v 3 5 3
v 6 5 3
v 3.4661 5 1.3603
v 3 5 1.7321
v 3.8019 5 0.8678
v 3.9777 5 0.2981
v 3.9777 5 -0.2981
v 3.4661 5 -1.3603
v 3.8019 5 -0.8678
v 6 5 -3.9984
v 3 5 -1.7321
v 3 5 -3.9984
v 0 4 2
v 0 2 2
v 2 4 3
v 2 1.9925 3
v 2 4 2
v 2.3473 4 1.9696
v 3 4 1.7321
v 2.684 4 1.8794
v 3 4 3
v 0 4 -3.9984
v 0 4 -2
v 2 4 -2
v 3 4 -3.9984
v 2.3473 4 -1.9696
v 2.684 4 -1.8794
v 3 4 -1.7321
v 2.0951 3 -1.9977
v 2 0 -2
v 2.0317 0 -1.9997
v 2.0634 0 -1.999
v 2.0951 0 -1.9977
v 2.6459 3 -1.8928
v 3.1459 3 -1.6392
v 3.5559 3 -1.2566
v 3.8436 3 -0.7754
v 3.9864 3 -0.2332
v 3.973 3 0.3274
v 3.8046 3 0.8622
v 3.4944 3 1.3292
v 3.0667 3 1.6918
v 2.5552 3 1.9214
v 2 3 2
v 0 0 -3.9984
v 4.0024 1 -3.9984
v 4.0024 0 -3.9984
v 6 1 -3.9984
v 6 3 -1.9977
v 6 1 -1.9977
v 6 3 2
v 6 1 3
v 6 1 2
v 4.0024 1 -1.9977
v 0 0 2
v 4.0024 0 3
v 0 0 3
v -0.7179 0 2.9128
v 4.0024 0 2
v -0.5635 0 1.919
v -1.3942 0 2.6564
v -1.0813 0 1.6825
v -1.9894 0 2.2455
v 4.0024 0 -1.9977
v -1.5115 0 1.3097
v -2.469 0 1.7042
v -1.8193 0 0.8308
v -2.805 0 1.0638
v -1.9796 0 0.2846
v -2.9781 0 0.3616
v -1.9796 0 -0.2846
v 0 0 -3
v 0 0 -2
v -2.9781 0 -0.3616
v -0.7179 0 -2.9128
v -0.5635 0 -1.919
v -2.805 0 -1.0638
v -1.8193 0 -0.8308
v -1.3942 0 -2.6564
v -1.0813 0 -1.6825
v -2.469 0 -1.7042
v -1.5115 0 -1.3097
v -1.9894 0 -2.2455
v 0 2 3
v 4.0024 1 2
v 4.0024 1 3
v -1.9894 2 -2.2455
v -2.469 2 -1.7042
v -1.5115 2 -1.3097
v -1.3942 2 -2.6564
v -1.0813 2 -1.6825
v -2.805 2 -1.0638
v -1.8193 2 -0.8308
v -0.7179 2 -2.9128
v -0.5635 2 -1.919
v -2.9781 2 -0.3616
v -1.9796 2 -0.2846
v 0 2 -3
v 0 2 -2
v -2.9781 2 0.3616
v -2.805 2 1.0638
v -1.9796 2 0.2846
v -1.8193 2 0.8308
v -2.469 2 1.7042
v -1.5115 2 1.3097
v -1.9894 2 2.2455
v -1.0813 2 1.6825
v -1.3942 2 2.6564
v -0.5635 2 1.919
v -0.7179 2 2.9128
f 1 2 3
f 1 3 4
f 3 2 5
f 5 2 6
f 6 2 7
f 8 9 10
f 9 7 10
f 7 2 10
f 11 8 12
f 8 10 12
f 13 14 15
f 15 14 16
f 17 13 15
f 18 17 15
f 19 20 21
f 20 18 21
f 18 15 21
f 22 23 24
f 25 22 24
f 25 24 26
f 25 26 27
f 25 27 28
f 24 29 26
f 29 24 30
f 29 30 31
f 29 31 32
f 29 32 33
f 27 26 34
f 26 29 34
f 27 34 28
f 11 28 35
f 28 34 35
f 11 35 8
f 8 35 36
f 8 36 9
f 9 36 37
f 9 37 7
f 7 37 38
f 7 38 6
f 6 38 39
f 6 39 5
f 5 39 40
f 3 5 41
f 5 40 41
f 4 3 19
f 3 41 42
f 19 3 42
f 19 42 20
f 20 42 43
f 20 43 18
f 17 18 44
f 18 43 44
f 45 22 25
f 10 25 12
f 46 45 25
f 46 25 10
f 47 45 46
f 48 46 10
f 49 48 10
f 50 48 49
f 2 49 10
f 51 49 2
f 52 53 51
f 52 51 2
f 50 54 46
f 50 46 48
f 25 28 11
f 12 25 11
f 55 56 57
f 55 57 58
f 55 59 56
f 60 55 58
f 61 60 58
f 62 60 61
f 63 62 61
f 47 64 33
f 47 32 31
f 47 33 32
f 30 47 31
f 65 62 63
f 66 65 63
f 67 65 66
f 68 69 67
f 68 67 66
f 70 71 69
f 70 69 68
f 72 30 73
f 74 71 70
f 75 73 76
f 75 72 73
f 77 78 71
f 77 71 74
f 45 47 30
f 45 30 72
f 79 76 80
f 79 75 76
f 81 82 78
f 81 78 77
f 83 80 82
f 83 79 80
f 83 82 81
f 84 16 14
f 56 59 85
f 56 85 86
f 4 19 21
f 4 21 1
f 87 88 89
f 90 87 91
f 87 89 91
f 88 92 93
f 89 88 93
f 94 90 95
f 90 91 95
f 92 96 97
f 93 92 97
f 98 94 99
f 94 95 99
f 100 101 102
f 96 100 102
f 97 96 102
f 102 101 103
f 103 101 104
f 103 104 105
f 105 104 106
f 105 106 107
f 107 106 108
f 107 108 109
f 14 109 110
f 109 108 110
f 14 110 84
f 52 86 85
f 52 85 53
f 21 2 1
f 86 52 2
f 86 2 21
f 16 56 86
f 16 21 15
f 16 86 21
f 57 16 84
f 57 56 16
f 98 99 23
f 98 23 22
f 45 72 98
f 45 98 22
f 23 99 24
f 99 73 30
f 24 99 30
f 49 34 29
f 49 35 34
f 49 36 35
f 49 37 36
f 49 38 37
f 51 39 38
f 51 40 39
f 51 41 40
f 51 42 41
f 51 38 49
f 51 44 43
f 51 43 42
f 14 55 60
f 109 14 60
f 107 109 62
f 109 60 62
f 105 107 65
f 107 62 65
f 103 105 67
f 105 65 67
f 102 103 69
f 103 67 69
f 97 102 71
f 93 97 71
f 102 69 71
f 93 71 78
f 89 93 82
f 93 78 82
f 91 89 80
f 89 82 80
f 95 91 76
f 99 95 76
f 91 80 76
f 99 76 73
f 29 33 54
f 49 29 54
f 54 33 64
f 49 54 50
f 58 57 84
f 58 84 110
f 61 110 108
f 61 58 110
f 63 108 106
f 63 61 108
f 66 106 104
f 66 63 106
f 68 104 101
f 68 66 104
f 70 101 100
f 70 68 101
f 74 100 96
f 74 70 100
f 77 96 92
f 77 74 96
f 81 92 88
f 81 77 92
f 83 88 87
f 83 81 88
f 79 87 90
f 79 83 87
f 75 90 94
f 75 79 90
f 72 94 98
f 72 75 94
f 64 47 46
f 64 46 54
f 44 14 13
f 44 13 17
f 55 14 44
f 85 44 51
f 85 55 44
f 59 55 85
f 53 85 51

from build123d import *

# Parameters (mm, degrees)
BOSS_EXTRUDE1_DEPTH = 5
CUT_EXTRUDE10_DEPTH = 7
SKETCH4_W           = 1.997648265
SKETCH4_H           = 6.998360209
CUT_EXTRUDE11_DEPTH = 1
SKETCH5_W           = 6
SKETCH5_H           = 3.997736752
CUT_EXTRUDE12_DEPTH = 3
CUT_EXTRUDE13_DEPTH = 3


with BuildPart() as part:
    # Sketch2 → Boss-Extrude1 (new body)
    with BuildSketch(Plane(origin=(0, 0, 0), x_dir=(1, 0, 0), z_dir=(0, 1, 0))):
        with BuildLine():
            Line((0, 3), (0, 3.998360209))
            Line((0, 3.998360209), (6, 3.998360209))
            Line((6, 3.998360209), (6, -3))
            Line((6, -3), (0, -3))
            ThreePointArc((0, -3), (-3, 0), (0, 3))
        make_face()
        with BuildLine():
            Line((0, 2), (2, 2))
            ThreePointArc((2, 2), (4, 0), (2, -2))
            Line((2, -2), (0, -2))
            ThreePointArc((0, -2), (-2, 0), (0, 2))
        make_face(mode=Mode.SUBTRACT)
    extrude(amount=BOSS_EXTRUDE1_DEPTH)

    # Sketch3 → Cut-Extrude10 (cut)
    with BuildSketch(Plane.XY.offset(3)):
        Polygon((3, 5), (-3, 5), (-3, 4), (-3, 2), (0, 2), (0, 4), (3, 4), align=None)
    extrude(amount=-CUT_EXTRUDE10_DEPTH, mode=Mode.SUBTRACT)

    # Sketch4 → Cut-Extrude11 (cut)
    with BuildSketch(Plane.XZ):
        with Locations((5.001175868, -0.499180105)):
            Rectangle(SKETCH4_W, SKETCH4_H)
    extrude(amount=-CUT_EXTRUDE11_DEPTH, mode=Mode.SUBTRACT)

    # Sketch5 → Cut-Extrude12 (cut)
    with BuildSketch(Plane.XZ):
        with Locations((3, 0.001131624)):
            Rectangle(SKETCH5_W, SKETCH5_H)
    extrude(amount=-CUT_EXTRUDE12_DEPTH, mode=Mode.SUBTRACT)

    # 3DSketch1 → Cut-Extrude13 (cut, along a direction that is not the sketch's normal)
    with BuildSketch(Plane(origin=(0, 2, 2), x_dir=(0.6666666666666625, 0.66666666666667, 0.3333333333333349), z_dir=(0.4472135954999618, 0, -0.894427190999914))):
        Polygon((0, 0), (1.333333333, -1.490711985), (3, 0), (1.661678745, 1.496288651), align=None)
    extrude(amount=-CUT_EXTRUDE13_DEPTH, dir=(0, 0, -1), mode=Mode.SUBTRACT)


solid = part.part
